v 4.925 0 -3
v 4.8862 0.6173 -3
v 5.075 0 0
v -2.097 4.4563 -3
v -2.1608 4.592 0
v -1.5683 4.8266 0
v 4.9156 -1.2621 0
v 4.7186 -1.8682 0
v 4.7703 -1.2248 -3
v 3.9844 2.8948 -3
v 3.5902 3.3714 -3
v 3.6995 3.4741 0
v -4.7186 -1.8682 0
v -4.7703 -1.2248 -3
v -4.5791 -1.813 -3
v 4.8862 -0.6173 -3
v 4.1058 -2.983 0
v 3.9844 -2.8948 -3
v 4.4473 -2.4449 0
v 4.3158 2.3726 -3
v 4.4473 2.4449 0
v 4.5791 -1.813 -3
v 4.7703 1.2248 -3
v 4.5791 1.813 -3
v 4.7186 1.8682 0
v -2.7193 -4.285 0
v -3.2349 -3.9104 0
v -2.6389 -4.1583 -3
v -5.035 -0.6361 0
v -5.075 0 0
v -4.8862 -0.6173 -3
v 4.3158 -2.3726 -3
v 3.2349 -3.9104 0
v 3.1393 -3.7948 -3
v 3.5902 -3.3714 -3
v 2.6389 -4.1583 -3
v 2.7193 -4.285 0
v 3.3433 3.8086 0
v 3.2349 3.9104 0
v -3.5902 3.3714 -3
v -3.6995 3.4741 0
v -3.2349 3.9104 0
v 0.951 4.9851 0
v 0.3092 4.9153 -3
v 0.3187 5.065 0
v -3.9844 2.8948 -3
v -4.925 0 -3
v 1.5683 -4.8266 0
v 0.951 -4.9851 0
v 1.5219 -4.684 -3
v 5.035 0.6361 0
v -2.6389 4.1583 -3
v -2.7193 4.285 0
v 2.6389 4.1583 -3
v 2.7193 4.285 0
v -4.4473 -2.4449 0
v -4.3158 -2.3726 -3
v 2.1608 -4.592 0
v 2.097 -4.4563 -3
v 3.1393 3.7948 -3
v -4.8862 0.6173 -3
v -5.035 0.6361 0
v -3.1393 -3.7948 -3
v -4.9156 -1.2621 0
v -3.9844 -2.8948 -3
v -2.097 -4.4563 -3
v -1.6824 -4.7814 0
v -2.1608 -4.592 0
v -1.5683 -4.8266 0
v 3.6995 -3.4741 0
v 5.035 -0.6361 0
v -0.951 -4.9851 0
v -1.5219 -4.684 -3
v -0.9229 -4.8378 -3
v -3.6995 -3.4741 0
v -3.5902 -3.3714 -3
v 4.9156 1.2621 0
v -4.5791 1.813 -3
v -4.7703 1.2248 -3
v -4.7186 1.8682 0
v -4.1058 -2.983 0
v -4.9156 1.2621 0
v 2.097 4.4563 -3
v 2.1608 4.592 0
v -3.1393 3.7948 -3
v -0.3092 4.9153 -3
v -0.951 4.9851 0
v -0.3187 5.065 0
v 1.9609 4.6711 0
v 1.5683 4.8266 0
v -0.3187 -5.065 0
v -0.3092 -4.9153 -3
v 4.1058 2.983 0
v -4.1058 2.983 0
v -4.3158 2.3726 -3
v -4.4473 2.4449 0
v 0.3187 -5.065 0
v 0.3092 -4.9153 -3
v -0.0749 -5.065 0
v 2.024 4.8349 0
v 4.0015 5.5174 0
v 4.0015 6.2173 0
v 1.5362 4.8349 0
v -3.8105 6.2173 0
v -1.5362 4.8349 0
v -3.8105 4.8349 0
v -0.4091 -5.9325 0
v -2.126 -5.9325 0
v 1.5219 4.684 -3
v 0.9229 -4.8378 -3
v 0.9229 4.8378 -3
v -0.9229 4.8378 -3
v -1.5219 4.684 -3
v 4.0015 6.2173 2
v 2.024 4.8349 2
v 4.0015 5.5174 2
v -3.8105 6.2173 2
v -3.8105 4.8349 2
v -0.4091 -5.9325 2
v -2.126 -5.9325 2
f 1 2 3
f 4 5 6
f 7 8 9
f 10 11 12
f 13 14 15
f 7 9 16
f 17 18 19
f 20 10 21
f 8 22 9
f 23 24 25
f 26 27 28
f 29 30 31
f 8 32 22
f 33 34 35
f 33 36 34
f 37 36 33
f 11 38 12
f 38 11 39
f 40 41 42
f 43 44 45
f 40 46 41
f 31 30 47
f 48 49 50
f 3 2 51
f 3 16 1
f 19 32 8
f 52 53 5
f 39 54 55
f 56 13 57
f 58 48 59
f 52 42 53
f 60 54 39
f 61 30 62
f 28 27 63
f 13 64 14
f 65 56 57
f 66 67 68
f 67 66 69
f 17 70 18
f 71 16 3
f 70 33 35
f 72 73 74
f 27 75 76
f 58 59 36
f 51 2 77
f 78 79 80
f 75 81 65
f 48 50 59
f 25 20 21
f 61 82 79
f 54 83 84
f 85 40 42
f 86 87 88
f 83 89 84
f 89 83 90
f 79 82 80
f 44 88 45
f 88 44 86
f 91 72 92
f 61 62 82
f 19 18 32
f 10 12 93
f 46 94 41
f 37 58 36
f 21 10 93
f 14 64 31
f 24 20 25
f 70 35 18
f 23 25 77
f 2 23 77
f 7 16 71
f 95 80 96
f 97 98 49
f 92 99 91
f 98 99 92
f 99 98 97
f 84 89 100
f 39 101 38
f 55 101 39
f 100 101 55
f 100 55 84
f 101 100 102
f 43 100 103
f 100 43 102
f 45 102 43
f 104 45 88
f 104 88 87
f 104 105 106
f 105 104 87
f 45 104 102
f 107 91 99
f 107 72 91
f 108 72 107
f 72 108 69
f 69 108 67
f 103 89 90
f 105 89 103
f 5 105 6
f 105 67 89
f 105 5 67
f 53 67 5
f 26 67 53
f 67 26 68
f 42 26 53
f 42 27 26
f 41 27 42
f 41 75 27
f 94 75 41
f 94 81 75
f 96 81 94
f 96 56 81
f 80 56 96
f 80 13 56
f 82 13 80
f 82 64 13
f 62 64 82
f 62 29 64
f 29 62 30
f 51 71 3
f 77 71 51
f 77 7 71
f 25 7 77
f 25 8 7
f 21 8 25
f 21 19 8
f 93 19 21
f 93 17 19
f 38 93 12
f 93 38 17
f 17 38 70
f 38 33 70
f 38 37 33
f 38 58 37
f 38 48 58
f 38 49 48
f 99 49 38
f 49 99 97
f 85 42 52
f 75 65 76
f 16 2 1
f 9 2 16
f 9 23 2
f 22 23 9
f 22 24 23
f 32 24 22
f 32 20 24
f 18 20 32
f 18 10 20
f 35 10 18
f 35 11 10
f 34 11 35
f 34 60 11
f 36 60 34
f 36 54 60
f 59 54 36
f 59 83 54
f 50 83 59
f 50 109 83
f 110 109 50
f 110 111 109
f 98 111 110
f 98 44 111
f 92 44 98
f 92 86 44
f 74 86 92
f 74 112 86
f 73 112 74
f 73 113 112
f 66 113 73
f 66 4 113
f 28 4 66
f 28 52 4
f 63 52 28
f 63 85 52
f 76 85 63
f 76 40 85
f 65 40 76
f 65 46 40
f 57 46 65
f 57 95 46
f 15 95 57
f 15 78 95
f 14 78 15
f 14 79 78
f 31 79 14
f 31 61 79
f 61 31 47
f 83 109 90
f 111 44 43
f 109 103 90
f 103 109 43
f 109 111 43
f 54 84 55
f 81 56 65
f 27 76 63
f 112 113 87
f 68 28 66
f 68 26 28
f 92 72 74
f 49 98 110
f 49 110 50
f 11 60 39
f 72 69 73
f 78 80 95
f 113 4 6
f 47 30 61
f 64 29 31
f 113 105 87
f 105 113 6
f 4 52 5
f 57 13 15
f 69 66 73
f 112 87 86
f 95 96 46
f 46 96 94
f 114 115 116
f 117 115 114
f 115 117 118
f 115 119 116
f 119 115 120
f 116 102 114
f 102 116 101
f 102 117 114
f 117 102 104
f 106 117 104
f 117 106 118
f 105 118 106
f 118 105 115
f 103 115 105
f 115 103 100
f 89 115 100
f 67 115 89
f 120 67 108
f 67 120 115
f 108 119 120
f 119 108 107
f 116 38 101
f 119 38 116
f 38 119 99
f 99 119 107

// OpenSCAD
$fn = 50;

difference() {
	union() {
		translate(v = [0, 0, -3.0]) {
			cylinder(h = 3, r1 = 4.925, r2 = 5.075);
		}
		linear_extrude(height = 2) {
			text(font = "Impact", halign = "center", size = 12, text = "7", valign = "center");
		}
	}
	union();
}
